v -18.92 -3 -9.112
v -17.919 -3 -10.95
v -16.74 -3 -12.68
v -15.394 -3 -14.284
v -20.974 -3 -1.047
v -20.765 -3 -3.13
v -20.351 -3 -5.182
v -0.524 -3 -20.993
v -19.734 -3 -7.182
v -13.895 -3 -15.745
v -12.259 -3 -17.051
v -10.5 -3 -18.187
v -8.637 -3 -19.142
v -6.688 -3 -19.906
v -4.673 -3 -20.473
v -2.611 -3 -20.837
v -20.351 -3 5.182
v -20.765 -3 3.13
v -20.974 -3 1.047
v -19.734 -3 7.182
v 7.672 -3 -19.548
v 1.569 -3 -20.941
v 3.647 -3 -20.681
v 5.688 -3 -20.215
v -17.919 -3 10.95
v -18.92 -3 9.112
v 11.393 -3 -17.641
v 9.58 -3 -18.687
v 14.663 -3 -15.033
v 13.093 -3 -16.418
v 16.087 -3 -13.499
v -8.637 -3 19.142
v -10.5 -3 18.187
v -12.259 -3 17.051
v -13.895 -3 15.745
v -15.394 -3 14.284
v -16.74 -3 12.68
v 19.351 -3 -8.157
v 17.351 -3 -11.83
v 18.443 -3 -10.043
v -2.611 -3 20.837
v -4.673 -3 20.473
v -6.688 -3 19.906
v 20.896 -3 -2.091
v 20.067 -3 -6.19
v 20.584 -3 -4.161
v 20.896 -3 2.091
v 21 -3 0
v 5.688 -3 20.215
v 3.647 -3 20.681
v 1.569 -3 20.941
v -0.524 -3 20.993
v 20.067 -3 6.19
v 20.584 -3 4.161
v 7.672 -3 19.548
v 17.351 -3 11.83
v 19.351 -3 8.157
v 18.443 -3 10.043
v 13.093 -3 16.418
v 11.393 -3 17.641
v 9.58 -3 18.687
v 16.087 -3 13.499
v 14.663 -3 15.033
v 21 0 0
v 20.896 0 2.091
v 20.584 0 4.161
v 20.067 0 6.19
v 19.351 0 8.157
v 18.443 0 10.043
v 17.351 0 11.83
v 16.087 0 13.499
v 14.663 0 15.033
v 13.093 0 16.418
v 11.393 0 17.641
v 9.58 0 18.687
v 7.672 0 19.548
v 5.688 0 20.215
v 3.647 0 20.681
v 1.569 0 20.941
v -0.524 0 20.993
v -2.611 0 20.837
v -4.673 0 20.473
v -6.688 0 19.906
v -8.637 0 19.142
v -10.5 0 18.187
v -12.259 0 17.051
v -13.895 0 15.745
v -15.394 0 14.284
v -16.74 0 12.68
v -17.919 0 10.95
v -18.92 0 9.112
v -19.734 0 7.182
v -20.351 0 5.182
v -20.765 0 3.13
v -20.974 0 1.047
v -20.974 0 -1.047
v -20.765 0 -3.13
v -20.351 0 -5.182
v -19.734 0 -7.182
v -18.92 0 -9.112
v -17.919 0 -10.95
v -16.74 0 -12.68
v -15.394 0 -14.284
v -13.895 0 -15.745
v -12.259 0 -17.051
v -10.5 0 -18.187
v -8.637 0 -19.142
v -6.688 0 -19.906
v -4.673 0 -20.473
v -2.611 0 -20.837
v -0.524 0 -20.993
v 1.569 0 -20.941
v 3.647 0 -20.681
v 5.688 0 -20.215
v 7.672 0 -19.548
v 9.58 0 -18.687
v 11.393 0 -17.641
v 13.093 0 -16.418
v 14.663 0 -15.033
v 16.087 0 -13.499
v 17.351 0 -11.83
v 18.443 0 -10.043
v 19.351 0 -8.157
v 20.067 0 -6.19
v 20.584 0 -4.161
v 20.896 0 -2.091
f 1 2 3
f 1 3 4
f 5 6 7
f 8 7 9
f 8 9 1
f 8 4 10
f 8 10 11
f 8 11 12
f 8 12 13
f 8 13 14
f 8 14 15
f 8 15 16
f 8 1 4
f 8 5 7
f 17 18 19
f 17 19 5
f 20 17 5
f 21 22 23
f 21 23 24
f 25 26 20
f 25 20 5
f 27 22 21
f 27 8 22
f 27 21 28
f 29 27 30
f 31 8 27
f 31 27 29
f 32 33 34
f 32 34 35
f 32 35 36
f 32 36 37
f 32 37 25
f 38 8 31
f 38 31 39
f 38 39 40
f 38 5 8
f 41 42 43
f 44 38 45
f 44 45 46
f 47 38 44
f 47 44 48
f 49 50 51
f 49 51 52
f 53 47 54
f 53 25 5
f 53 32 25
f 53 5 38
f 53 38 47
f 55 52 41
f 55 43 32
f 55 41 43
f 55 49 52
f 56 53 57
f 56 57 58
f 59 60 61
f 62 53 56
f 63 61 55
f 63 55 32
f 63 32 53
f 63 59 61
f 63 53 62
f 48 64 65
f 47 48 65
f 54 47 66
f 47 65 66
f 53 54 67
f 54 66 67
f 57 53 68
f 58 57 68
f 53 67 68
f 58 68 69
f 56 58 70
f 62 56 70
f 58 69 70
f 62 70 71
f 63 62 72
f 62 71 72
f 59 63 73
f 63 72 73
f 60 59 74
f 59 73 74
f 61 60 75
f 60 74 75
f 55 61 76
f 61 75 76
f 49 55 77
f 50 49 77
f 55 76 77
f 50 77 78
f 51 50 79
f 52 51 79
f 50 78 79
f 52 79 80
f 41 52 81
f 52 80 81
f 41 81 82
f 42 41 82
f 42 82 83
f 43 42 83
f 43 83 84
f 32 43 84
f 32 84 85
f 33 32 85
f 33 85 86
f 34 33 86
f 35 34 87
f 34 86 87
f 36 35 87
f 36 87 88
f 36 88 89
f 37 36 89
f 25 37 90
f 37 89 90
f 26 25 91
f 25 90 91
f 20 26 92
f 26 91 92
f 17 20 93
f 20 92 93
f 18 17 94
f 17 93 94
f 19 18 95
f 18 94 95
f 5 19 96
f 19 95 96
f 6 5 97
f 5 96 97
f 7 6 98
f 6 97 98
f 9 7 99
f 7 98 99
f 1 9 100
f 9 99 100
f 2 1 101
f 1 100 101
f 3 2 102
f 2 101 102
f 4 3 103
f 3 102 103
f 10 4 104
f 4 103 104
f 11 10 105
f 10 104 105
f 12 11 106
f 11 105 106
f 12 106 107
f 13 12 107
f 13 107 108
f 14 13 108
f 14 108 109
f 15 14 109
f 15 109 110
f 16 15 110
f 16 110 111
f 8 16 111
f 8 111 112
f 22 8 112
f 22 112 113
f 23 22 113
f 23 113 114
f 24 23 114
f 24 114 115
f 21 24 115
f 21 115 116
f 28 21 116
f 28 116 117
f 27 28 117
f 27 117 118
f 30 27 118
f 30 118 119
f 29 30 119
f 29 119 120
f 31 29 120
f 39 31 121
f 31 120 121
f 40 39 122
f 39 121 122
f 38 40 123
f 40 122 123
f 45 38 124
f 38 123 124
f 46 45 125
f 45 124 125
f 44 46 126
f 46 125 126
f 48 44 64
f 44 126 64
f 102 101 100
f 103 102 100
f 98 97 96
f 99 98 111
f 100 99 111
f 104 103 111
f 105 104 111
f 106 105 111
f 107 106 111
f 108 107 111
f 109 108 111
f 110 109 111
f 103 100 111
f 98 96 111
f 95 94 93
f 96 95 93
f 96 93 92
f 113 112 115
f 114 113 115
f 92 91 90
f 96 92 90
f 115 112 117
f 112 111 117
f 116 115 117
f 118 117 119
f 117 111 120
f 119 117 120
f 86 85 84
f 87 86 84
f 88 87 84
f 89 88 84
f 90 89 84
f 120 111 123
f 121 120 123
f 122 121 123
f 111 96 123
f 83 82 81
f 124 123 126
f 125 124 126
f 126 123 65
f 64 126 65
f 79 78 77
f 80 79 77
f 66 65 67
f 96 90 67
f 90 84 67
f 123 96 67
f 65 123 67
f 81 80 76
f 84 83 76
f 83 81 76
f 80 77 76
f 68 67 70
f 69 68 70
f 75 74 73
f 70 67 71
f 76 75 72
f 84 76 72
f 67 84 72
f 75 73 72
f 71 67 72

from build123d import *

# Parameters (mm, degrees)
F0_R     = 21
F1_DEPTH = 3
F2_R     = 3.248876
F2_R_2   = 2.201596
F2_R_3   = 3.392524
F2_R_4   = 2.223105
F2_R_5   = 3.218428
F2_R_6   = 2.097756
F3_DEPTH = 25
F4_R     = 3.419132
F5_DEPTH = 25


with BuildPart() as f1:
    # F0 (on Front) → F1 (new body)
    with BuildSketch(Plane.XZ):
        Circle(F0_R)
    extrude(amount=F1_DEPTH)

    # F2 (on Front) → F3 (cut)
    with BuildSketch(Plane.XZ):
        with Locations((0, 28.620865)):
            Circle(F2_R)
        with Locations((0, 28.620865)):
            Circle(F2_R_2, mode=Mode.SUBTRACT)
        with Locations((24.881644, -14.200577)):
            Circle(F2_R_3)
        with Locations((24.881644, -14.200577)):
            Circle(F2_R_4, mode=Mode.SUBTRACT)
        with Locations((-24.80519, -14.200577)):
            Circle(F2_R_5)
        with Locations((-24.80519, -14.200577)):
            Circle(F2_R_6, mode=Mode.SUBTRACT)
    extrude(amount=-F3_DEPTH, mode=Mode.SUBTRACT)

    # F4 (on Front) → F5 (cut)
    with BuildSketch(Plane.XZ):
        with Locations((0, 28.712314)):
            Circle(F4_R)
    extrude(amount=-F5_DEPTH, mode=Mode.SUBTRACT)


solid = f1.part
